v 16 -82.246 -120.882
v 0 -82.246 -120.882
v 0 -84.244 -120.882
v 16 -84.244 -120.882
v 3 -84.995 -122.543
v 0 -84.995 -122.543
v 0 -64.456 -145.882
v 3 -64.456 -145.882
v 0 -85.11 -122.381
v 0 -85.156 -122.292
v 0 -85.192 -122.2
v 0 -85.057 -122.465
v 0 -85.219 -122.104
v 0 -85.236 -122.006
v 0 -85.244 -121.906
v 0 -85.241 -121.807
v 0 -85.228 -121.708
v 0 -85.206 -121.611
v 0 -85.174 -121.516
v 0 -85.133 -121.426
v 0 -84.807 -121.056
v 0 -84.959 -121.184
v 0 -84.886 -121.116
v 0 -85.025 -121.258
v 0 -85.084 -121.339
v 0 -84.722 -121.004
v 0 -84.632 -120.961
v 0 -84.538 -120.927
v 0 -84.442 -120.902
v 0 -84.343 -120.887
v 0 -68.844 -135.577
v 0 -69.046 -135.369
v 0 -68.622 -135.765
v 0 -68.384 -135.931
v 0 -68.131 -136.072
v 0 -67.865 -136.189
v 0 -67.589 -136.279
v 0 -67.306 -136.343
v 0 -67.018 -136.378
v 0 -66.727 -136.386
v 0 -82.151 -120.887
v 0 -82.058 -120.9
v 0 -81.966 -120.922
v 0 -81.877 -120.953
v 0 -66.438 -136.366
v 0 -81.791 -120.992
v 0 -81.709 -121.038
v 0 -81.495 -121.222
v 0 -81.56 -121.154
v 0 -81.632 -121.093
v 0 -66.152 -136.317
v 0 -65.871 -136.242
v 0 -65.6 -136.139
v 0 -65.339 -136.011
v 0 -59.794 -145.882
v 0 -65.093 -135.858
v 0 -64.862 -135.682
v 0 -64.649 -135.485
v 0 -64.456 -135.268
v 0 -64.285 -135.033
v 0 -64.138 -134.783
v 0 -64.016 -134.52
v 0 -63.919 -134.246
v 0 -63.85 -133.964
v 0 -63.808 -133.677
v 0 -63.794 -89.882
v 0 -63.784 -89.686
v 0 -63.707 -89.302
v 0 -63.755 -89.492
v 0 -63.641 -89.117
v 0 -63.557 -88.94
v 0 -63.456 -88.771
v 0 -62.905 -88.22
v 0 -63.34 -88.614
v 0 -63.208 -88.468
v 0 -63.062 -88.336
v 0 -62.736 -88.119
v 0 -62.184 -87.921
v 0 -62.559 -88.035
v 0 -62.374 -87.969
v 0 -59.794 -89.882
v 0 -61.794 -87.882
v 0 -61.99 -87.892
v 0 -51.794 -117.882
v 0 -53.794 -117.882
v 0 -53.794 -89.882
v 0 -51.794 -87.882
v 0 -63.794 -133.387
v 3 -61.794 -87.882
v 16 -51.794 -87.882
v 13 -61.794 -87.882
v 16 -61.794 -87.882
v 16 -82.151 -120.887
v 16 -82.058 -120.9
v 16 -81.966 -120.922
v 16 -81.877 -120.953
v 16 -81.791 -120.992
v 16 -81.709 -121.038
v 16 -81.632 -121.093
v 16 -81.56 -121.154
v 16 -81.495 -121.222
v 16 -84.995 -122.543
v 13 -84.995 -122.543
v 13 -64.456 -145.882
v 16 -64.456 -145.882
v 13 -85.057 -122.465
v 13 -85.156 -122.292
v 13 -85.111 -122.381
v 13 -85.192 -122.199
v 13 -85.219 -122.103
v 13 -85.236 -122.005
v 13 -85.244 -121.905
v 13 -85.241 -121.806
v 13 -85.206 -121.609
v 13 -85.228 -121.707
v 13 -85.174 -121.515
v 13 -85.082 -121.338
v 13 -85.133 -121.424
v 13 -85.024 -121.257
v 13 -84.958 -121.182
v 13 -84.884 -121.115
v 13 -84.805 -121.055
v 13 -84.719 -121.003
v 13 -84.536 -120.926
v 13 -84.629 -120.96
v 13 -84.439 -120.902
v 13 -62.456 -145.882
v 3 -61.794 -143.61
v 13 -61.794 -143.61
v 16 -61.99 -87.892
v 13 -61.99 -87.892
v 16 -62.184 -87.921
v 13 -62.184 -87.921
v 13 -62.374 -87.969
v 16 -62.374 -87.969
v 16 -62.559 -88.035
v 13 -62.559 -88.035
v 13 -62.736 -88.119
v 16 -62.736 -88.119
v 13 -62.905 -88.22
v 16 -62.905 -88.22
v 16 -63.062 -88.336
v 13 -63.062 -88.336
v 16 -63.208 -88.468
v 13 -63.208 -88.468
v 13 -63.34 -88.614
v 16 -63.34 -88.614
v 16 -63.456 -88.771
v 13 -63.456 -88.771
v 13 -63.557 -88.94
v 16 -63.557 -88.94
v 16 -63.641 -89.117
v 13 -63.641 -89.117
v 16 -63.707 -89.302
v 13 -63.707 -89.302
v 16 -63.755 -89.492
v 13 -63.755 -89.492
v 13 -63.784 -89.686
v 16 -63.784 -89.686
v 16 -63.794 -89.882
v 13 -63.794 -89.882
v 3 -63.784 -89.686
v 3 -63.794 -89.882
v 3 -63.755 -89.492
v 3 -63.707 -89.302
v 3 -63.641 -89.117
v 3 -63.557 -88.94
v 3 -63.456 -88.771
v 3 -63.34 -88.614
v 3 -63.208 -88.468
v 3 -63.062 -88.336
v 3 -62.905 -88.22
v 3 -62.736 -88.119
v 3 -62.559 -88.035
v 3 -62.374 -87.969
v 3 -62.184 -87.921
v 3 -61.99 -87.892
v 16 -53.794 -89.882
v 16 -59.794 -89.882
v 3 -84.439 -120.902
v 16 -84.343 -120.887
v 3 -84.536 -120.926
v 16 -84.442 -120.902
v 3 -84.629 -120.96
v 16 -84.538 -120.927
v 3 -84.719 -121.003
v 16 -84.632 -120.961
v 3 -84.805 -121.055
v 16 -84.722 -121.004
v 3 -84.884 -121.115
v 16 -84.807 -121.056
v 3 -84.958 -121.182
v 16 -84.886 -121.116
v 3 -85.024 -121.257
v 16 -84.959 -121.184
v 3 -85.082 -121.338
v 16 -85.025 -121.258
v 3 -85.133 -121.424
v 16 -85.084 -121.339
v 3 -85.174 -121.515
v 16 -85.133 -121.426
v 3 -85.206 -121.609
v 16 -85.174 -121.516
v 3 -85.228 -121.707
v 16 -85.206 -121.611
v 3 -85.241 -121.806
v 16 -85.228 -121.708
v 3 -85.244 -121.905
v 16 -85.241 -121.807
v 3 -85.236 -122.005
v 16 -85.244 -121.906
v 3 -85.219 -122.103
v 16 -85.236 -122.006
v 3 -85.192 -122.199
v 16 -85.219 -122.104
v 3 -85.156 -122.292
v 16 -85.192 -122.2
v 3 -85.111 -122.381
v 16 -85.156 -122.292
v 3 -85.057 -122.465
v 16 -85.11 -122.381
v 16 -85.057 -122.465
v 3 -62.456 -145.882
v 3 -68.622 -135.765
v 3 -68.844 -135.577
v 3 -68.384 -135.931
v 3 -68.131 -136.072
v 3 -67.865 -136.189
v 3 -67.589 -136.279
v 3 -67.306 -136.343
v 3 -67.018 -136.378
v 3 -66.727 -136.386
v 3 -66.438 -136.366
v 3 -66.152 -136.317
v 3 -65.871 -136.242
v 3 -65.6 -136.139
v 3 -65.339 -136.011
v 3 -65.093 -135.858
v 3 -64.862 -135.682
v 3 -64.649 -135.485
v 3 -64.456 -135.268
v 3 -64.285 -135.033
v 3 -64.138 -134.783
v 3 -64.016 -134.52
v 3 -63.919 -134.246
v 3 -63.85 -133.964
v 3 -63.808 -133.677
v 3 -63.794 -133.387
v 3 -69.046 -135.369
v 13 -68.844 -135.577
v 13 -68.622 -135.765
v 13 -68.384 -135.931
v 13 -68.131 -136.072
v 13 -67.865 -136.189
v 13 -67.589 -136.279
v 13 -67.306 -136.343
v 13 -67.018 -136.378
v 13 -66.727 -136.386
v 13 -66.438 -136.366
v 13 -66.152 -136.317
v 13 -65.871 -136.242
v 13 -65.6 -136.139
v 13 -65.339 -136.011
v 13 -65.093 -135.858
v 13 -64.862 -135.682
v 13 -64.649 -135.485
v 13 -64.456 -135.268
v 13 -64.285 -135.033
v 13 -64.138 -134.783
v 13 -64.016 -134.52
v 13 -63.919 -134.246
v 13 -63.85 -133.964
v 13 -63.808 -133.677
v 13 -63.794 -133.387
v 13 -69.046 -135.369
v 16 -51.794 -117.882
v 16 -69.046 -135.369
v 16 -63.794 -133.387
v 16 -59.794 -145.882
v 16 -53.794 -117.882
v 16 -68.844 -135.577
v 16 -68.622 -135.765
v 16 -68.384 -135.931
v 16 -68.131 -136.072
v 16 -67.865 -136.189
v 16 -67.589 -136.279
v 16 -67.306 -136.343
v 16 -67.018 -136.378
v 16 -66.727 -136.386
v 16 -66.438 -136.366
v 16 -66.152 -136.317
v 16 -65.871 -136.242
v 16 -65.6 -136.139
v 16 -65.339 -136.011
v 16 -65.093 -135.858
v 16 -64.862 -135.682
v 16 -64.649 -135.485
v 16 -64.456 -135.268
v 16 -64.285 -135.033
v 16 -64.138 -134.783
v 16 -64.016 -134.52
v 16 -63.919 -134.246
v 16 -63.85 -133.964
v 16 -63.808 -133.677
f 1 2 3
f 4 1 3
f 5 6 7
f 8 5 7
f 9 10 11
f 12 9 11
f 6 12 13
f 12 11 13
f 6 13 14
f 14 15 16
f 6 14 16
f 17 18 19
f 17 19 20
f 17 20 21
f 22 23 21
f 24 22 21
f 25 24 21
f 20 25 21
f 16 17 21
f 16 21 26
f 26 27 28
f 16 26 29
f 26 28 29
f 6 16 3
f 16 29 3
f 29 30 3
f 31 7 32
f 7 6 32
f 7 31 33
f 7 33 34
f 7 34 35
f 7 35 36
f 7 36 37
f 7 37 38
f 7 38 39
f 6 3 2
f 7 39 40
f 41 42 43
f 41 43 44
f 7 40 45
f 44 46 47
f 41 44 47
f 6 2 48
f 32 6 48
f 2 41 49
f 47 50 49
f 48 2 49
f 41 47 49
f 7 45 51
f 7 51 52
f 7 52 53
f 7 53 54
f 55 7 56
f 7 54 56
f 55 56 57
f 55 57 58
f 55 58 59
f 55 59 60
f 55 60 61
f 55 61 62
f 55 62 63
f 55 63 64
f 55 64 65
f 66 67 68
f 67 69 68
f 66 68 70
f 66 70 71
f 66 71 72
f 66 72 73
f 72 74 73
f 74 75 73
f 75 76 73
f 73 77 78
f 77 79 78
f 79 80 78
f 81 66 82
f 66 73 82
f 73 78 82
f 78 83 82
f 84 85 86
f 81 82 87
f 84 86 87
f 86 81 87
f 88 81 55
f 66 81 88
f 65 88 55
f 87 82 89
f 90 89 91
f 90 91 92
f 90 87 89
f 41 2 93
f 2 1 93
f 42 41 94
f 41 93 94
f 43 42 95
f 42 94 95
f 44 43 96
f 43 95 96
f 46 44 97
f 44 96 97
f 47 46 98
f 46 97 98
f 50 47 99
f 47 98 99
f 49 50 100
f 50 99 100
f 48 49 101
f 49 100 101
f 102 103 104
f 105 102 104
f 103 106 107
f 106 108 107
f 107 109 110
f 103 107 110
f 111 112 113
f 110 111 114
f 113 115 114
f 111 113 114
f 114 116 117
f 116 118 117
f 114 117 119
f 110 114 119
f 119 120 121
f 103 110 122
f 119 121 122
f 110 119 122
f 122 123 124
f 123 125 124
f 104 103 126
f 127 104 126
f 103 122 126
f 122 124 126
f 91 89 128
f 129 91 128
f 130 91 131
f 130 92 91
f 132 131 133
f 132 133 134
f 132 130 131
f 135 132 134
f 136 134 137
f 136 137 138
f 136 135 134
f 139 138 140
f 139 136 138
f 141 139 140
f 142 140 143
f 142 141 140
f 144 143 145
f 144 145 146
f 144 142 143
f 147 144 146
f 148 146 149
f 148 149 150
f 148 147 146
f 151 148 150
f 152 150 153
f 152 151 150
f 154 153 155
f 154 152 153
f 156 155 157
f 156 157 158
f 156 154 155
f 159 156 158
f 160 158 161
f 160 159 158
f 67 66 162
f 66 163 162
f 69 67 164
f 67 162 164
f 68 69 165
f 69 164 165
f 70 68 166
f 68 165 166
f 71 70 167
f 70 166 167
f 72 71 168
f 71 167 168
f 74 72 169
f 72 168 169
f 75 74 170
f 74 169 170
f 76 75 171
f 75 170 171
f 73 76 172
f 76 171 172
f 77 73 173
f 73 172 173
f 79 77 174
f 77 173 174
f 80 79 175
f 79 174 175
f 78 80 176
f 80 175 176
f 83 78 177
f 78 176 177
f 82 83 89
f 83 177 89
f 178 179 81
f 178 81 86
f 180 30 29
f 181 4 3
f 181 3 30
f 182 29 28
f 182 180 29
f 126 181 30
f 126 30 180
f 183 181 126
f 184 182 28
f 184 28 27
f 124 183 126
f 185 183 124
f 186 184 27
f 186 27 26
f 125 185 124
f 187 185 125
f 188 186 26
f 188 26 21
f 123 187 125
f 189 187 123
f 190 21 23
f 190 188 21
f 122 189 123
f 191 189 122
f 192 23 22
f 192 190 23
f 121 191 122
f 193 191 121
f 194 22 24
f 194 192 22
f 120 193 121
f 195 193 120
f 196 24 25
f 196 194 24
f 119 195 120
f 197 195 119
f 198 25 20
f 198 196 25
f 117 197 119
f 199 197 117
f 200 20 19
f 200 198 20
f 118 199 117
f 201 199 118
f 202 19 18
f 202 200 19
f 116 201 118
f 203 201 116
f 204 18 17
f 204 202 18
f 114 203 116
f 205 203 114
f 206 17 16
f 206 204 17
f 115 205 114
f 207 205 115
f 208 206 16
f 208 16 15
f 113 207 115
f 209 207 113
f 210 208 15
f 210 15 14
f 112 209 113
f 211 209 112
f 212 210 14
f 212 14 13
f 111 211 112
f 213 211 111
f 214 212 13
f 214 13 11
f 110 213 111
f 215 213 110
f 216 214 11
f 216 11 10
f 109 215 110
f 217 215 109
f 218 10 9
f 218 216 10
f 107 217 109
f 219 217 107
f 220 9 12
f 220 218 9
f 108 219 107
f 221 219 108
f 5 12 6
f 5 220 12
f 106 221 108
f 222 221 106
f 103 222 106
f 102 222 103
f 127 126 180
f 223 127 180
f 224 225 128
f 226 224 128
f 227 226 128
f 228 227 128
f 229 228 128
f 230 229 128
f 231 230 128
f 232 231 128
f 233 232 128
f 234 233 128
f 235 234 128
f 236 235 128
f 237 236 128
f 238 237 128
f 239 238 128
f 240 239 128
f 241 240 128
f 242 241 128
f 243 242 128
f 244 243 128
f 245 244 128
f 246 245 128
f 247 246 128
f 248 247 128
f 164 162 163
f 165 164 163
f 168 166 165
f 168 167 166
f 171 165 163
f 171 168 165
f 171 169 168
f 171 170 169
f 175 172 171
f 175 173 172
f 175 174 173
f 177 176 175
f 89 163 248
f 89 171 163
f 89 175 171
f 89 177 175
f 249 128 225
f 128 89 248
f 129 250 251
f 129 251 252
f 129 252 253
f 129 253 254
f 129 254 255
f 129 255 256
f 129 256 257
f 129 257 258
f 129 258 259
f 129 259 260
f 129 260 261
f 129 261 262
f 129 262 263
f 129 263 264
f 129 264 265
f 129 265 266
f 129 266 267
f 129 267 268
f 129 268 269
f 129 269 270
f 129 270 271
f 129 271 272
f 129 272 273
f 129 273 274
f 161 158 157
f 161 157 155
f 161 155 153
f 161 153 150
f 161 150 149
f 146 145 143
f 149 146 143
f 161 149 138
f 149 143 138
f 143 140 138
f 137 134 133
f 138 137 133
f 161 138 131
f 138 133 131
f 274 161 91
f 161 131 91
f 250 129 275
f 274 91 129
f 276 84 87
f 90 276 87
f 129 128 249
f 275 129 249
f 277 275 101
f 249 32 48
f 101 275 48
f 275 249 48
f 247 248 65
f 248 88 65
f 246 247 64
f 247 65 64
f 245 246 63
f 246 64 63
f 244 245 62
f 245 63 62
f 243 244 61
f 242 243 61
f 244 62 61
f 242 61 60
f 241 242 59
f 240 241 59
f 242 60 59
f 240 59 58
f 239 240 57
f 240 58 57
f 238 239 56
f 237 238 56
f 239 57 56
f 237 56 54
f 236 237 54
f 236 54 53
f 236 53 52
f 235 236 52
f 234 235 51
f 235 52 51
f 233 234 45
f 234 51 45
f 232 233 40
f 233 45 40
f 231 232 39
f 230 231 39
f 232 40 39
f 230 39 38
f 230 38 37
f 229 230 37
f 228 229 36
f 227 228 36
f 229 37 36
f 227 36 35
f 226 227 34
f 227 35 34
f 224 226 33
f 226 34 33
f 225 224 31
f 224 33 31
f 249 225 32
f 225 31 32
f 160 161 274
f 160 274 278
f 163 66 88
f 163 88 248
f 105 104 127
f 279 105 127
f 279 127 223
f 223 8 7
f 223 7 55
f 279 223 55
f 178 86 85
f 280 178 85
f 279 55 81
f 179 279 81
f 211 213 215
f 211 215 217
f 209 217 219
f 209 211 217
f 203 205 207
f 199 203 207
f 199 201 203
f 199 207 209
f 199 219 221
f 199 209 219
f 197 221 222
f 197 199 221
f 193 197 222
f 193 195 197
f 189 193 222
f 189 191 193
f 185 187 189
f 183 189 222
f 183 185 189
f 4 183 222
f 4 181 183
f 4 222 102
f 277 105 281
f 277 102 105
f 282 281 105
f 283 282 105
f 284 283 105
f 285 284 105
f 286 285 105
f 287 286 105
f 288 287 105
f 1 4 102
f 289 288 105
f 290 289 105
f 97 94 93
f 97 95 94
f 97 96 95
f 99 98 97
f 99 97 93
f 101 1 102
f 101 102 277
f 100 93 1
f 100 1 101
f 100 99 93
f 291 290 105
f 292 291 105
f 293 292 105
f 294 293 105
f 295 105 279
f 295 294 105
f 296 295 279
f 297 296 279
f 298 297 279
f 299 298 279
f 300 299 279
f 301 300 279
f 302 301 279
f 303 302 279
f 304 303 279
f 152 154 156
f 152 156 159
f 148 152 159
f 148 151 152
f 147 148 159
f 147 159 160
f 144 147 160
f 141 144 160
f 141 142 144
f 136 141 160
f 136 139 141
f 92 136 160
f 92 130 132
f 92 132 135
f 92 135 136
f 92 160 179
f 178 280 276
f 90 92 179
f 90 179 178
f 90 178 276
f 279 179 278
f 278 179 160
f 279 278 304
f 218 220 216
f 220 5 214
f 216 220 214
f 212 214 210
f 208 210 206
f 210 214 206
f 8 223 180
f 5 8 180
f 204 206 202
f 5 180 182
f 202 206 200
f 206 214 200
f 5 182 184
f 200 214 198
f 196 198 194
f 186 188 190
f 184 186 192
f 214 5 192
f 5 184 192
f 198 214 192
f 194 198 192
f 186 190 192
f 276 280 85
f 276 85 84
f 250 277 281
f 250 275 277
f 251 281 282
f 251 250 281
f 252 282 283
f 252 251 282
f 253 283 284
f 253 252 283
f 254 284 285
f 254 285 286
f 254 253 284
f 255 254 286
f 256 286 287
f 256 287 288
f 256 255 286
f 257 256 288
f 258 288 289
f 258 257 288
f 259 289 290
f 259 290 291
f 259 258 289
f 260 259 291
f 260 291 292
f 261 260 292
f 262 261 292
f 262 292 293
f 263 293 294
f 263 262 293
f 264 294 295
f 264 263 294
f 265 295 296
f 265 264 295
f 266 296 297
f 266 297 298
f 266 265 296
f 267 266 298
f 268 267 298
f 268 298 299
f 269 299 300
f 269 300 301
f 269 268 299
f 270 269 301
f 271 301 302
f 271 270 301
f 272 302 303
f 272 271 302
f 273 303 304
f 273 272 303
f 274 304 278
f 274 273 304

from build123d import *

# Parameters (mm, degrees)
F1_DEPTH = 16
F2_W     = 3
F2_H     = 2
F3_DEPTH = 58
F4_W     = 10
F4_H     = 2
F6_F1_R  = 0.9999
F7_R     = 1
F8_R     = 2
F9_R     = 3


# Not quite as in the source:
# - a fillet or chamfer is up to 0.001 mm smaller than in the source, because OpenCascade refuses the exact size


with BuildPart() as f1:
    # F0 (on Right) → F1 (new body)
    with BuildSketch(Plane.YZ):
        Polygon((-61.7935170661, -87.8824494406), (-61.7935170661, -143.6097221679), (-81.7935170661, -120.8824494406), (-86.4557482916, -120.8824494406), (-64.4557482916, -145.8824494406), (-59.7935170661, -145.8824494406), (-59.7935170661, -89.8824494406), (-53.7935170661, -89.8824494406), (-53.7935170661, -117.8824494406), (-51.7935170661, -117.8824494406), (-51.7935170661, -87.8824494406), align=None)
    extrude(amount=F1_DEPTH)

    # F2 (on face) → F3 (join)
    with BuildSketch(Plane.XY.offset(-87.8824494406)):
        with Locations((1.5, -62.7935170661)):
            Rectangle(F2_W, F2_H)
        with Locations((14.5, -62.7935170661)):
            Rectangle(F2_W, F2_H)
    extrude(amount=-F3_DEPTH)

    # F5: sweep along a path in F5_path
    with BuildLine(Plane(origin=(16, -64.4557482916, -145.8824494406), x_dir=(0, 0.6606278949, -0.7507135169), z_dir=(0, 0.7507135169, 0.6606278949))) as f5_path:
        Line((0, 0), (-33.3016516107, 0))
    # F4 (on face) → F5 (sweep, cut)
    with BuildSketch(Plane.XY.offset(-120.8824494406)):
        with Locations((8, -85.4557482916)):
            Rectangle(F4_W, F4_H)
    sweep(path=f5_path.line, mode=Mode.SUBTRACT)

    # F6: fillet of radius 1 on 2 edges, made by hand

    # F6_f1 (radius 1 in the source; OpenCascade refuses exactly that, so slightly less here)
    f6_f1_edges = [f1.edges().sort_by_distance(p)[0] for p in [
        (1.5, -86.4557482916, -120.8824494406),
    ]]
    fillet(f6_f1_edges, radius=F6_F1_R)

    # F7
    f7_edges = [f1.edges().sort_by_distance(p)[0] for p in [
        (8, -81.793517, -120.882449),
    ]]
    fillet(f7_edges, radius=F7_R)

    # F8
    f8_edges = [f1.edges().sort_by_distance(p)[0] for p in [
        (14.5, -63.793517, -87.882449),
        (1.5, -63.793517, -87.882449),
    ]]
    fillet(f8_edges, radius=F8_R)

    # F9
    f9_edges = [f1.edges().sort_by_distance(p)[0] for p in [
        (14.5, -63.793517, -141.336995),
        (1.5, -63.793517, -141.336995),
    ]]
    fillet(f9_edges, radius=F9_R)


solid = f1.part
